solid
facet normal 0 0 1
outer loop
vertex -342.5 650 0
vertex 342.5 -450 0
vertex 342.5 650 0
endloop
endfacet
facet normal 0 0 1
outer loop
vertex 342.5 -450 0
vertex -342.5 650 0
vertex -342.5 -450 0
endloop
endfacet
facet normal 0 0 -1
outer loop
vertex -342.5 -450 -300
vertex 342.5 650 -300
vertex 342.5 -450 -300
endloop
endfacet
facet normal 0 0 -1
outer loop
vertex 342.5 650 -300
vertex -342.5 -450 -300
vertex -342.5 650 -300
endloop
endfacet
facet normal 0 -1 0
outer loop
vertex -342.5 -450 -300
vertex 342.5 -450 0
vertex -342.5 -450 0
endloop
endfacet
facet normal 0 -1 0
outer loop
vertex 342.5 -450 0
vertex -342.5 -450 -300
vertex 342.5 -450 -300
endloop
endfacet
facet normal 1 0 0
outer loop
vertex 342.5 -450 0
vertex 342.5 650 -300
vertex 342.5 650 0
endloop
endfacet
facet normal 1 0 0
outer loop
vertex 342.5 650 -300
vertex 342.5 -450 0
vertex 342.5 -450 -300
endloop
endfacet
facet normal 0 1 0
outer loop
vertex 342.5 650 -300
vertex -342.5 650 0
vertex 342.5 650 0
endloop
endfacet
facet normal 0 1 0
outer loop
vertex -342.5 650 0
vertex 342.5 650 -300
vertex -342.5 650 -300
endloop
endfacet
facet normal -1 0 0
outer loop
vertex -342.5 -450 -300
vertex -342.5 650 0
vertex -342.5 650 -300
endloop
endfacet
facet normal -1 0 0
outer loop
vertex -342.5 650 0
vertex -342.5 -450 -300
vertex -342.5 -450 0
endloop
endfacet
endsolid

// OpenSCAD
vana_vyska = 300;

vana_sirka = 685;
vana_delka = 1100;

vana_offset = 450;

VanaModel();

module VanaModel(){

    color("white")
    translate([-vana_sirka/2,-vana_offset,-vana_vyska])
    difference() {
        cube([vana_sirka,vana_delka,vana_vyska]);
        //translate([5,5,5])
        //cube([vana_sirka-10,vana_delka-10,vana_vyska]);
    }

}
